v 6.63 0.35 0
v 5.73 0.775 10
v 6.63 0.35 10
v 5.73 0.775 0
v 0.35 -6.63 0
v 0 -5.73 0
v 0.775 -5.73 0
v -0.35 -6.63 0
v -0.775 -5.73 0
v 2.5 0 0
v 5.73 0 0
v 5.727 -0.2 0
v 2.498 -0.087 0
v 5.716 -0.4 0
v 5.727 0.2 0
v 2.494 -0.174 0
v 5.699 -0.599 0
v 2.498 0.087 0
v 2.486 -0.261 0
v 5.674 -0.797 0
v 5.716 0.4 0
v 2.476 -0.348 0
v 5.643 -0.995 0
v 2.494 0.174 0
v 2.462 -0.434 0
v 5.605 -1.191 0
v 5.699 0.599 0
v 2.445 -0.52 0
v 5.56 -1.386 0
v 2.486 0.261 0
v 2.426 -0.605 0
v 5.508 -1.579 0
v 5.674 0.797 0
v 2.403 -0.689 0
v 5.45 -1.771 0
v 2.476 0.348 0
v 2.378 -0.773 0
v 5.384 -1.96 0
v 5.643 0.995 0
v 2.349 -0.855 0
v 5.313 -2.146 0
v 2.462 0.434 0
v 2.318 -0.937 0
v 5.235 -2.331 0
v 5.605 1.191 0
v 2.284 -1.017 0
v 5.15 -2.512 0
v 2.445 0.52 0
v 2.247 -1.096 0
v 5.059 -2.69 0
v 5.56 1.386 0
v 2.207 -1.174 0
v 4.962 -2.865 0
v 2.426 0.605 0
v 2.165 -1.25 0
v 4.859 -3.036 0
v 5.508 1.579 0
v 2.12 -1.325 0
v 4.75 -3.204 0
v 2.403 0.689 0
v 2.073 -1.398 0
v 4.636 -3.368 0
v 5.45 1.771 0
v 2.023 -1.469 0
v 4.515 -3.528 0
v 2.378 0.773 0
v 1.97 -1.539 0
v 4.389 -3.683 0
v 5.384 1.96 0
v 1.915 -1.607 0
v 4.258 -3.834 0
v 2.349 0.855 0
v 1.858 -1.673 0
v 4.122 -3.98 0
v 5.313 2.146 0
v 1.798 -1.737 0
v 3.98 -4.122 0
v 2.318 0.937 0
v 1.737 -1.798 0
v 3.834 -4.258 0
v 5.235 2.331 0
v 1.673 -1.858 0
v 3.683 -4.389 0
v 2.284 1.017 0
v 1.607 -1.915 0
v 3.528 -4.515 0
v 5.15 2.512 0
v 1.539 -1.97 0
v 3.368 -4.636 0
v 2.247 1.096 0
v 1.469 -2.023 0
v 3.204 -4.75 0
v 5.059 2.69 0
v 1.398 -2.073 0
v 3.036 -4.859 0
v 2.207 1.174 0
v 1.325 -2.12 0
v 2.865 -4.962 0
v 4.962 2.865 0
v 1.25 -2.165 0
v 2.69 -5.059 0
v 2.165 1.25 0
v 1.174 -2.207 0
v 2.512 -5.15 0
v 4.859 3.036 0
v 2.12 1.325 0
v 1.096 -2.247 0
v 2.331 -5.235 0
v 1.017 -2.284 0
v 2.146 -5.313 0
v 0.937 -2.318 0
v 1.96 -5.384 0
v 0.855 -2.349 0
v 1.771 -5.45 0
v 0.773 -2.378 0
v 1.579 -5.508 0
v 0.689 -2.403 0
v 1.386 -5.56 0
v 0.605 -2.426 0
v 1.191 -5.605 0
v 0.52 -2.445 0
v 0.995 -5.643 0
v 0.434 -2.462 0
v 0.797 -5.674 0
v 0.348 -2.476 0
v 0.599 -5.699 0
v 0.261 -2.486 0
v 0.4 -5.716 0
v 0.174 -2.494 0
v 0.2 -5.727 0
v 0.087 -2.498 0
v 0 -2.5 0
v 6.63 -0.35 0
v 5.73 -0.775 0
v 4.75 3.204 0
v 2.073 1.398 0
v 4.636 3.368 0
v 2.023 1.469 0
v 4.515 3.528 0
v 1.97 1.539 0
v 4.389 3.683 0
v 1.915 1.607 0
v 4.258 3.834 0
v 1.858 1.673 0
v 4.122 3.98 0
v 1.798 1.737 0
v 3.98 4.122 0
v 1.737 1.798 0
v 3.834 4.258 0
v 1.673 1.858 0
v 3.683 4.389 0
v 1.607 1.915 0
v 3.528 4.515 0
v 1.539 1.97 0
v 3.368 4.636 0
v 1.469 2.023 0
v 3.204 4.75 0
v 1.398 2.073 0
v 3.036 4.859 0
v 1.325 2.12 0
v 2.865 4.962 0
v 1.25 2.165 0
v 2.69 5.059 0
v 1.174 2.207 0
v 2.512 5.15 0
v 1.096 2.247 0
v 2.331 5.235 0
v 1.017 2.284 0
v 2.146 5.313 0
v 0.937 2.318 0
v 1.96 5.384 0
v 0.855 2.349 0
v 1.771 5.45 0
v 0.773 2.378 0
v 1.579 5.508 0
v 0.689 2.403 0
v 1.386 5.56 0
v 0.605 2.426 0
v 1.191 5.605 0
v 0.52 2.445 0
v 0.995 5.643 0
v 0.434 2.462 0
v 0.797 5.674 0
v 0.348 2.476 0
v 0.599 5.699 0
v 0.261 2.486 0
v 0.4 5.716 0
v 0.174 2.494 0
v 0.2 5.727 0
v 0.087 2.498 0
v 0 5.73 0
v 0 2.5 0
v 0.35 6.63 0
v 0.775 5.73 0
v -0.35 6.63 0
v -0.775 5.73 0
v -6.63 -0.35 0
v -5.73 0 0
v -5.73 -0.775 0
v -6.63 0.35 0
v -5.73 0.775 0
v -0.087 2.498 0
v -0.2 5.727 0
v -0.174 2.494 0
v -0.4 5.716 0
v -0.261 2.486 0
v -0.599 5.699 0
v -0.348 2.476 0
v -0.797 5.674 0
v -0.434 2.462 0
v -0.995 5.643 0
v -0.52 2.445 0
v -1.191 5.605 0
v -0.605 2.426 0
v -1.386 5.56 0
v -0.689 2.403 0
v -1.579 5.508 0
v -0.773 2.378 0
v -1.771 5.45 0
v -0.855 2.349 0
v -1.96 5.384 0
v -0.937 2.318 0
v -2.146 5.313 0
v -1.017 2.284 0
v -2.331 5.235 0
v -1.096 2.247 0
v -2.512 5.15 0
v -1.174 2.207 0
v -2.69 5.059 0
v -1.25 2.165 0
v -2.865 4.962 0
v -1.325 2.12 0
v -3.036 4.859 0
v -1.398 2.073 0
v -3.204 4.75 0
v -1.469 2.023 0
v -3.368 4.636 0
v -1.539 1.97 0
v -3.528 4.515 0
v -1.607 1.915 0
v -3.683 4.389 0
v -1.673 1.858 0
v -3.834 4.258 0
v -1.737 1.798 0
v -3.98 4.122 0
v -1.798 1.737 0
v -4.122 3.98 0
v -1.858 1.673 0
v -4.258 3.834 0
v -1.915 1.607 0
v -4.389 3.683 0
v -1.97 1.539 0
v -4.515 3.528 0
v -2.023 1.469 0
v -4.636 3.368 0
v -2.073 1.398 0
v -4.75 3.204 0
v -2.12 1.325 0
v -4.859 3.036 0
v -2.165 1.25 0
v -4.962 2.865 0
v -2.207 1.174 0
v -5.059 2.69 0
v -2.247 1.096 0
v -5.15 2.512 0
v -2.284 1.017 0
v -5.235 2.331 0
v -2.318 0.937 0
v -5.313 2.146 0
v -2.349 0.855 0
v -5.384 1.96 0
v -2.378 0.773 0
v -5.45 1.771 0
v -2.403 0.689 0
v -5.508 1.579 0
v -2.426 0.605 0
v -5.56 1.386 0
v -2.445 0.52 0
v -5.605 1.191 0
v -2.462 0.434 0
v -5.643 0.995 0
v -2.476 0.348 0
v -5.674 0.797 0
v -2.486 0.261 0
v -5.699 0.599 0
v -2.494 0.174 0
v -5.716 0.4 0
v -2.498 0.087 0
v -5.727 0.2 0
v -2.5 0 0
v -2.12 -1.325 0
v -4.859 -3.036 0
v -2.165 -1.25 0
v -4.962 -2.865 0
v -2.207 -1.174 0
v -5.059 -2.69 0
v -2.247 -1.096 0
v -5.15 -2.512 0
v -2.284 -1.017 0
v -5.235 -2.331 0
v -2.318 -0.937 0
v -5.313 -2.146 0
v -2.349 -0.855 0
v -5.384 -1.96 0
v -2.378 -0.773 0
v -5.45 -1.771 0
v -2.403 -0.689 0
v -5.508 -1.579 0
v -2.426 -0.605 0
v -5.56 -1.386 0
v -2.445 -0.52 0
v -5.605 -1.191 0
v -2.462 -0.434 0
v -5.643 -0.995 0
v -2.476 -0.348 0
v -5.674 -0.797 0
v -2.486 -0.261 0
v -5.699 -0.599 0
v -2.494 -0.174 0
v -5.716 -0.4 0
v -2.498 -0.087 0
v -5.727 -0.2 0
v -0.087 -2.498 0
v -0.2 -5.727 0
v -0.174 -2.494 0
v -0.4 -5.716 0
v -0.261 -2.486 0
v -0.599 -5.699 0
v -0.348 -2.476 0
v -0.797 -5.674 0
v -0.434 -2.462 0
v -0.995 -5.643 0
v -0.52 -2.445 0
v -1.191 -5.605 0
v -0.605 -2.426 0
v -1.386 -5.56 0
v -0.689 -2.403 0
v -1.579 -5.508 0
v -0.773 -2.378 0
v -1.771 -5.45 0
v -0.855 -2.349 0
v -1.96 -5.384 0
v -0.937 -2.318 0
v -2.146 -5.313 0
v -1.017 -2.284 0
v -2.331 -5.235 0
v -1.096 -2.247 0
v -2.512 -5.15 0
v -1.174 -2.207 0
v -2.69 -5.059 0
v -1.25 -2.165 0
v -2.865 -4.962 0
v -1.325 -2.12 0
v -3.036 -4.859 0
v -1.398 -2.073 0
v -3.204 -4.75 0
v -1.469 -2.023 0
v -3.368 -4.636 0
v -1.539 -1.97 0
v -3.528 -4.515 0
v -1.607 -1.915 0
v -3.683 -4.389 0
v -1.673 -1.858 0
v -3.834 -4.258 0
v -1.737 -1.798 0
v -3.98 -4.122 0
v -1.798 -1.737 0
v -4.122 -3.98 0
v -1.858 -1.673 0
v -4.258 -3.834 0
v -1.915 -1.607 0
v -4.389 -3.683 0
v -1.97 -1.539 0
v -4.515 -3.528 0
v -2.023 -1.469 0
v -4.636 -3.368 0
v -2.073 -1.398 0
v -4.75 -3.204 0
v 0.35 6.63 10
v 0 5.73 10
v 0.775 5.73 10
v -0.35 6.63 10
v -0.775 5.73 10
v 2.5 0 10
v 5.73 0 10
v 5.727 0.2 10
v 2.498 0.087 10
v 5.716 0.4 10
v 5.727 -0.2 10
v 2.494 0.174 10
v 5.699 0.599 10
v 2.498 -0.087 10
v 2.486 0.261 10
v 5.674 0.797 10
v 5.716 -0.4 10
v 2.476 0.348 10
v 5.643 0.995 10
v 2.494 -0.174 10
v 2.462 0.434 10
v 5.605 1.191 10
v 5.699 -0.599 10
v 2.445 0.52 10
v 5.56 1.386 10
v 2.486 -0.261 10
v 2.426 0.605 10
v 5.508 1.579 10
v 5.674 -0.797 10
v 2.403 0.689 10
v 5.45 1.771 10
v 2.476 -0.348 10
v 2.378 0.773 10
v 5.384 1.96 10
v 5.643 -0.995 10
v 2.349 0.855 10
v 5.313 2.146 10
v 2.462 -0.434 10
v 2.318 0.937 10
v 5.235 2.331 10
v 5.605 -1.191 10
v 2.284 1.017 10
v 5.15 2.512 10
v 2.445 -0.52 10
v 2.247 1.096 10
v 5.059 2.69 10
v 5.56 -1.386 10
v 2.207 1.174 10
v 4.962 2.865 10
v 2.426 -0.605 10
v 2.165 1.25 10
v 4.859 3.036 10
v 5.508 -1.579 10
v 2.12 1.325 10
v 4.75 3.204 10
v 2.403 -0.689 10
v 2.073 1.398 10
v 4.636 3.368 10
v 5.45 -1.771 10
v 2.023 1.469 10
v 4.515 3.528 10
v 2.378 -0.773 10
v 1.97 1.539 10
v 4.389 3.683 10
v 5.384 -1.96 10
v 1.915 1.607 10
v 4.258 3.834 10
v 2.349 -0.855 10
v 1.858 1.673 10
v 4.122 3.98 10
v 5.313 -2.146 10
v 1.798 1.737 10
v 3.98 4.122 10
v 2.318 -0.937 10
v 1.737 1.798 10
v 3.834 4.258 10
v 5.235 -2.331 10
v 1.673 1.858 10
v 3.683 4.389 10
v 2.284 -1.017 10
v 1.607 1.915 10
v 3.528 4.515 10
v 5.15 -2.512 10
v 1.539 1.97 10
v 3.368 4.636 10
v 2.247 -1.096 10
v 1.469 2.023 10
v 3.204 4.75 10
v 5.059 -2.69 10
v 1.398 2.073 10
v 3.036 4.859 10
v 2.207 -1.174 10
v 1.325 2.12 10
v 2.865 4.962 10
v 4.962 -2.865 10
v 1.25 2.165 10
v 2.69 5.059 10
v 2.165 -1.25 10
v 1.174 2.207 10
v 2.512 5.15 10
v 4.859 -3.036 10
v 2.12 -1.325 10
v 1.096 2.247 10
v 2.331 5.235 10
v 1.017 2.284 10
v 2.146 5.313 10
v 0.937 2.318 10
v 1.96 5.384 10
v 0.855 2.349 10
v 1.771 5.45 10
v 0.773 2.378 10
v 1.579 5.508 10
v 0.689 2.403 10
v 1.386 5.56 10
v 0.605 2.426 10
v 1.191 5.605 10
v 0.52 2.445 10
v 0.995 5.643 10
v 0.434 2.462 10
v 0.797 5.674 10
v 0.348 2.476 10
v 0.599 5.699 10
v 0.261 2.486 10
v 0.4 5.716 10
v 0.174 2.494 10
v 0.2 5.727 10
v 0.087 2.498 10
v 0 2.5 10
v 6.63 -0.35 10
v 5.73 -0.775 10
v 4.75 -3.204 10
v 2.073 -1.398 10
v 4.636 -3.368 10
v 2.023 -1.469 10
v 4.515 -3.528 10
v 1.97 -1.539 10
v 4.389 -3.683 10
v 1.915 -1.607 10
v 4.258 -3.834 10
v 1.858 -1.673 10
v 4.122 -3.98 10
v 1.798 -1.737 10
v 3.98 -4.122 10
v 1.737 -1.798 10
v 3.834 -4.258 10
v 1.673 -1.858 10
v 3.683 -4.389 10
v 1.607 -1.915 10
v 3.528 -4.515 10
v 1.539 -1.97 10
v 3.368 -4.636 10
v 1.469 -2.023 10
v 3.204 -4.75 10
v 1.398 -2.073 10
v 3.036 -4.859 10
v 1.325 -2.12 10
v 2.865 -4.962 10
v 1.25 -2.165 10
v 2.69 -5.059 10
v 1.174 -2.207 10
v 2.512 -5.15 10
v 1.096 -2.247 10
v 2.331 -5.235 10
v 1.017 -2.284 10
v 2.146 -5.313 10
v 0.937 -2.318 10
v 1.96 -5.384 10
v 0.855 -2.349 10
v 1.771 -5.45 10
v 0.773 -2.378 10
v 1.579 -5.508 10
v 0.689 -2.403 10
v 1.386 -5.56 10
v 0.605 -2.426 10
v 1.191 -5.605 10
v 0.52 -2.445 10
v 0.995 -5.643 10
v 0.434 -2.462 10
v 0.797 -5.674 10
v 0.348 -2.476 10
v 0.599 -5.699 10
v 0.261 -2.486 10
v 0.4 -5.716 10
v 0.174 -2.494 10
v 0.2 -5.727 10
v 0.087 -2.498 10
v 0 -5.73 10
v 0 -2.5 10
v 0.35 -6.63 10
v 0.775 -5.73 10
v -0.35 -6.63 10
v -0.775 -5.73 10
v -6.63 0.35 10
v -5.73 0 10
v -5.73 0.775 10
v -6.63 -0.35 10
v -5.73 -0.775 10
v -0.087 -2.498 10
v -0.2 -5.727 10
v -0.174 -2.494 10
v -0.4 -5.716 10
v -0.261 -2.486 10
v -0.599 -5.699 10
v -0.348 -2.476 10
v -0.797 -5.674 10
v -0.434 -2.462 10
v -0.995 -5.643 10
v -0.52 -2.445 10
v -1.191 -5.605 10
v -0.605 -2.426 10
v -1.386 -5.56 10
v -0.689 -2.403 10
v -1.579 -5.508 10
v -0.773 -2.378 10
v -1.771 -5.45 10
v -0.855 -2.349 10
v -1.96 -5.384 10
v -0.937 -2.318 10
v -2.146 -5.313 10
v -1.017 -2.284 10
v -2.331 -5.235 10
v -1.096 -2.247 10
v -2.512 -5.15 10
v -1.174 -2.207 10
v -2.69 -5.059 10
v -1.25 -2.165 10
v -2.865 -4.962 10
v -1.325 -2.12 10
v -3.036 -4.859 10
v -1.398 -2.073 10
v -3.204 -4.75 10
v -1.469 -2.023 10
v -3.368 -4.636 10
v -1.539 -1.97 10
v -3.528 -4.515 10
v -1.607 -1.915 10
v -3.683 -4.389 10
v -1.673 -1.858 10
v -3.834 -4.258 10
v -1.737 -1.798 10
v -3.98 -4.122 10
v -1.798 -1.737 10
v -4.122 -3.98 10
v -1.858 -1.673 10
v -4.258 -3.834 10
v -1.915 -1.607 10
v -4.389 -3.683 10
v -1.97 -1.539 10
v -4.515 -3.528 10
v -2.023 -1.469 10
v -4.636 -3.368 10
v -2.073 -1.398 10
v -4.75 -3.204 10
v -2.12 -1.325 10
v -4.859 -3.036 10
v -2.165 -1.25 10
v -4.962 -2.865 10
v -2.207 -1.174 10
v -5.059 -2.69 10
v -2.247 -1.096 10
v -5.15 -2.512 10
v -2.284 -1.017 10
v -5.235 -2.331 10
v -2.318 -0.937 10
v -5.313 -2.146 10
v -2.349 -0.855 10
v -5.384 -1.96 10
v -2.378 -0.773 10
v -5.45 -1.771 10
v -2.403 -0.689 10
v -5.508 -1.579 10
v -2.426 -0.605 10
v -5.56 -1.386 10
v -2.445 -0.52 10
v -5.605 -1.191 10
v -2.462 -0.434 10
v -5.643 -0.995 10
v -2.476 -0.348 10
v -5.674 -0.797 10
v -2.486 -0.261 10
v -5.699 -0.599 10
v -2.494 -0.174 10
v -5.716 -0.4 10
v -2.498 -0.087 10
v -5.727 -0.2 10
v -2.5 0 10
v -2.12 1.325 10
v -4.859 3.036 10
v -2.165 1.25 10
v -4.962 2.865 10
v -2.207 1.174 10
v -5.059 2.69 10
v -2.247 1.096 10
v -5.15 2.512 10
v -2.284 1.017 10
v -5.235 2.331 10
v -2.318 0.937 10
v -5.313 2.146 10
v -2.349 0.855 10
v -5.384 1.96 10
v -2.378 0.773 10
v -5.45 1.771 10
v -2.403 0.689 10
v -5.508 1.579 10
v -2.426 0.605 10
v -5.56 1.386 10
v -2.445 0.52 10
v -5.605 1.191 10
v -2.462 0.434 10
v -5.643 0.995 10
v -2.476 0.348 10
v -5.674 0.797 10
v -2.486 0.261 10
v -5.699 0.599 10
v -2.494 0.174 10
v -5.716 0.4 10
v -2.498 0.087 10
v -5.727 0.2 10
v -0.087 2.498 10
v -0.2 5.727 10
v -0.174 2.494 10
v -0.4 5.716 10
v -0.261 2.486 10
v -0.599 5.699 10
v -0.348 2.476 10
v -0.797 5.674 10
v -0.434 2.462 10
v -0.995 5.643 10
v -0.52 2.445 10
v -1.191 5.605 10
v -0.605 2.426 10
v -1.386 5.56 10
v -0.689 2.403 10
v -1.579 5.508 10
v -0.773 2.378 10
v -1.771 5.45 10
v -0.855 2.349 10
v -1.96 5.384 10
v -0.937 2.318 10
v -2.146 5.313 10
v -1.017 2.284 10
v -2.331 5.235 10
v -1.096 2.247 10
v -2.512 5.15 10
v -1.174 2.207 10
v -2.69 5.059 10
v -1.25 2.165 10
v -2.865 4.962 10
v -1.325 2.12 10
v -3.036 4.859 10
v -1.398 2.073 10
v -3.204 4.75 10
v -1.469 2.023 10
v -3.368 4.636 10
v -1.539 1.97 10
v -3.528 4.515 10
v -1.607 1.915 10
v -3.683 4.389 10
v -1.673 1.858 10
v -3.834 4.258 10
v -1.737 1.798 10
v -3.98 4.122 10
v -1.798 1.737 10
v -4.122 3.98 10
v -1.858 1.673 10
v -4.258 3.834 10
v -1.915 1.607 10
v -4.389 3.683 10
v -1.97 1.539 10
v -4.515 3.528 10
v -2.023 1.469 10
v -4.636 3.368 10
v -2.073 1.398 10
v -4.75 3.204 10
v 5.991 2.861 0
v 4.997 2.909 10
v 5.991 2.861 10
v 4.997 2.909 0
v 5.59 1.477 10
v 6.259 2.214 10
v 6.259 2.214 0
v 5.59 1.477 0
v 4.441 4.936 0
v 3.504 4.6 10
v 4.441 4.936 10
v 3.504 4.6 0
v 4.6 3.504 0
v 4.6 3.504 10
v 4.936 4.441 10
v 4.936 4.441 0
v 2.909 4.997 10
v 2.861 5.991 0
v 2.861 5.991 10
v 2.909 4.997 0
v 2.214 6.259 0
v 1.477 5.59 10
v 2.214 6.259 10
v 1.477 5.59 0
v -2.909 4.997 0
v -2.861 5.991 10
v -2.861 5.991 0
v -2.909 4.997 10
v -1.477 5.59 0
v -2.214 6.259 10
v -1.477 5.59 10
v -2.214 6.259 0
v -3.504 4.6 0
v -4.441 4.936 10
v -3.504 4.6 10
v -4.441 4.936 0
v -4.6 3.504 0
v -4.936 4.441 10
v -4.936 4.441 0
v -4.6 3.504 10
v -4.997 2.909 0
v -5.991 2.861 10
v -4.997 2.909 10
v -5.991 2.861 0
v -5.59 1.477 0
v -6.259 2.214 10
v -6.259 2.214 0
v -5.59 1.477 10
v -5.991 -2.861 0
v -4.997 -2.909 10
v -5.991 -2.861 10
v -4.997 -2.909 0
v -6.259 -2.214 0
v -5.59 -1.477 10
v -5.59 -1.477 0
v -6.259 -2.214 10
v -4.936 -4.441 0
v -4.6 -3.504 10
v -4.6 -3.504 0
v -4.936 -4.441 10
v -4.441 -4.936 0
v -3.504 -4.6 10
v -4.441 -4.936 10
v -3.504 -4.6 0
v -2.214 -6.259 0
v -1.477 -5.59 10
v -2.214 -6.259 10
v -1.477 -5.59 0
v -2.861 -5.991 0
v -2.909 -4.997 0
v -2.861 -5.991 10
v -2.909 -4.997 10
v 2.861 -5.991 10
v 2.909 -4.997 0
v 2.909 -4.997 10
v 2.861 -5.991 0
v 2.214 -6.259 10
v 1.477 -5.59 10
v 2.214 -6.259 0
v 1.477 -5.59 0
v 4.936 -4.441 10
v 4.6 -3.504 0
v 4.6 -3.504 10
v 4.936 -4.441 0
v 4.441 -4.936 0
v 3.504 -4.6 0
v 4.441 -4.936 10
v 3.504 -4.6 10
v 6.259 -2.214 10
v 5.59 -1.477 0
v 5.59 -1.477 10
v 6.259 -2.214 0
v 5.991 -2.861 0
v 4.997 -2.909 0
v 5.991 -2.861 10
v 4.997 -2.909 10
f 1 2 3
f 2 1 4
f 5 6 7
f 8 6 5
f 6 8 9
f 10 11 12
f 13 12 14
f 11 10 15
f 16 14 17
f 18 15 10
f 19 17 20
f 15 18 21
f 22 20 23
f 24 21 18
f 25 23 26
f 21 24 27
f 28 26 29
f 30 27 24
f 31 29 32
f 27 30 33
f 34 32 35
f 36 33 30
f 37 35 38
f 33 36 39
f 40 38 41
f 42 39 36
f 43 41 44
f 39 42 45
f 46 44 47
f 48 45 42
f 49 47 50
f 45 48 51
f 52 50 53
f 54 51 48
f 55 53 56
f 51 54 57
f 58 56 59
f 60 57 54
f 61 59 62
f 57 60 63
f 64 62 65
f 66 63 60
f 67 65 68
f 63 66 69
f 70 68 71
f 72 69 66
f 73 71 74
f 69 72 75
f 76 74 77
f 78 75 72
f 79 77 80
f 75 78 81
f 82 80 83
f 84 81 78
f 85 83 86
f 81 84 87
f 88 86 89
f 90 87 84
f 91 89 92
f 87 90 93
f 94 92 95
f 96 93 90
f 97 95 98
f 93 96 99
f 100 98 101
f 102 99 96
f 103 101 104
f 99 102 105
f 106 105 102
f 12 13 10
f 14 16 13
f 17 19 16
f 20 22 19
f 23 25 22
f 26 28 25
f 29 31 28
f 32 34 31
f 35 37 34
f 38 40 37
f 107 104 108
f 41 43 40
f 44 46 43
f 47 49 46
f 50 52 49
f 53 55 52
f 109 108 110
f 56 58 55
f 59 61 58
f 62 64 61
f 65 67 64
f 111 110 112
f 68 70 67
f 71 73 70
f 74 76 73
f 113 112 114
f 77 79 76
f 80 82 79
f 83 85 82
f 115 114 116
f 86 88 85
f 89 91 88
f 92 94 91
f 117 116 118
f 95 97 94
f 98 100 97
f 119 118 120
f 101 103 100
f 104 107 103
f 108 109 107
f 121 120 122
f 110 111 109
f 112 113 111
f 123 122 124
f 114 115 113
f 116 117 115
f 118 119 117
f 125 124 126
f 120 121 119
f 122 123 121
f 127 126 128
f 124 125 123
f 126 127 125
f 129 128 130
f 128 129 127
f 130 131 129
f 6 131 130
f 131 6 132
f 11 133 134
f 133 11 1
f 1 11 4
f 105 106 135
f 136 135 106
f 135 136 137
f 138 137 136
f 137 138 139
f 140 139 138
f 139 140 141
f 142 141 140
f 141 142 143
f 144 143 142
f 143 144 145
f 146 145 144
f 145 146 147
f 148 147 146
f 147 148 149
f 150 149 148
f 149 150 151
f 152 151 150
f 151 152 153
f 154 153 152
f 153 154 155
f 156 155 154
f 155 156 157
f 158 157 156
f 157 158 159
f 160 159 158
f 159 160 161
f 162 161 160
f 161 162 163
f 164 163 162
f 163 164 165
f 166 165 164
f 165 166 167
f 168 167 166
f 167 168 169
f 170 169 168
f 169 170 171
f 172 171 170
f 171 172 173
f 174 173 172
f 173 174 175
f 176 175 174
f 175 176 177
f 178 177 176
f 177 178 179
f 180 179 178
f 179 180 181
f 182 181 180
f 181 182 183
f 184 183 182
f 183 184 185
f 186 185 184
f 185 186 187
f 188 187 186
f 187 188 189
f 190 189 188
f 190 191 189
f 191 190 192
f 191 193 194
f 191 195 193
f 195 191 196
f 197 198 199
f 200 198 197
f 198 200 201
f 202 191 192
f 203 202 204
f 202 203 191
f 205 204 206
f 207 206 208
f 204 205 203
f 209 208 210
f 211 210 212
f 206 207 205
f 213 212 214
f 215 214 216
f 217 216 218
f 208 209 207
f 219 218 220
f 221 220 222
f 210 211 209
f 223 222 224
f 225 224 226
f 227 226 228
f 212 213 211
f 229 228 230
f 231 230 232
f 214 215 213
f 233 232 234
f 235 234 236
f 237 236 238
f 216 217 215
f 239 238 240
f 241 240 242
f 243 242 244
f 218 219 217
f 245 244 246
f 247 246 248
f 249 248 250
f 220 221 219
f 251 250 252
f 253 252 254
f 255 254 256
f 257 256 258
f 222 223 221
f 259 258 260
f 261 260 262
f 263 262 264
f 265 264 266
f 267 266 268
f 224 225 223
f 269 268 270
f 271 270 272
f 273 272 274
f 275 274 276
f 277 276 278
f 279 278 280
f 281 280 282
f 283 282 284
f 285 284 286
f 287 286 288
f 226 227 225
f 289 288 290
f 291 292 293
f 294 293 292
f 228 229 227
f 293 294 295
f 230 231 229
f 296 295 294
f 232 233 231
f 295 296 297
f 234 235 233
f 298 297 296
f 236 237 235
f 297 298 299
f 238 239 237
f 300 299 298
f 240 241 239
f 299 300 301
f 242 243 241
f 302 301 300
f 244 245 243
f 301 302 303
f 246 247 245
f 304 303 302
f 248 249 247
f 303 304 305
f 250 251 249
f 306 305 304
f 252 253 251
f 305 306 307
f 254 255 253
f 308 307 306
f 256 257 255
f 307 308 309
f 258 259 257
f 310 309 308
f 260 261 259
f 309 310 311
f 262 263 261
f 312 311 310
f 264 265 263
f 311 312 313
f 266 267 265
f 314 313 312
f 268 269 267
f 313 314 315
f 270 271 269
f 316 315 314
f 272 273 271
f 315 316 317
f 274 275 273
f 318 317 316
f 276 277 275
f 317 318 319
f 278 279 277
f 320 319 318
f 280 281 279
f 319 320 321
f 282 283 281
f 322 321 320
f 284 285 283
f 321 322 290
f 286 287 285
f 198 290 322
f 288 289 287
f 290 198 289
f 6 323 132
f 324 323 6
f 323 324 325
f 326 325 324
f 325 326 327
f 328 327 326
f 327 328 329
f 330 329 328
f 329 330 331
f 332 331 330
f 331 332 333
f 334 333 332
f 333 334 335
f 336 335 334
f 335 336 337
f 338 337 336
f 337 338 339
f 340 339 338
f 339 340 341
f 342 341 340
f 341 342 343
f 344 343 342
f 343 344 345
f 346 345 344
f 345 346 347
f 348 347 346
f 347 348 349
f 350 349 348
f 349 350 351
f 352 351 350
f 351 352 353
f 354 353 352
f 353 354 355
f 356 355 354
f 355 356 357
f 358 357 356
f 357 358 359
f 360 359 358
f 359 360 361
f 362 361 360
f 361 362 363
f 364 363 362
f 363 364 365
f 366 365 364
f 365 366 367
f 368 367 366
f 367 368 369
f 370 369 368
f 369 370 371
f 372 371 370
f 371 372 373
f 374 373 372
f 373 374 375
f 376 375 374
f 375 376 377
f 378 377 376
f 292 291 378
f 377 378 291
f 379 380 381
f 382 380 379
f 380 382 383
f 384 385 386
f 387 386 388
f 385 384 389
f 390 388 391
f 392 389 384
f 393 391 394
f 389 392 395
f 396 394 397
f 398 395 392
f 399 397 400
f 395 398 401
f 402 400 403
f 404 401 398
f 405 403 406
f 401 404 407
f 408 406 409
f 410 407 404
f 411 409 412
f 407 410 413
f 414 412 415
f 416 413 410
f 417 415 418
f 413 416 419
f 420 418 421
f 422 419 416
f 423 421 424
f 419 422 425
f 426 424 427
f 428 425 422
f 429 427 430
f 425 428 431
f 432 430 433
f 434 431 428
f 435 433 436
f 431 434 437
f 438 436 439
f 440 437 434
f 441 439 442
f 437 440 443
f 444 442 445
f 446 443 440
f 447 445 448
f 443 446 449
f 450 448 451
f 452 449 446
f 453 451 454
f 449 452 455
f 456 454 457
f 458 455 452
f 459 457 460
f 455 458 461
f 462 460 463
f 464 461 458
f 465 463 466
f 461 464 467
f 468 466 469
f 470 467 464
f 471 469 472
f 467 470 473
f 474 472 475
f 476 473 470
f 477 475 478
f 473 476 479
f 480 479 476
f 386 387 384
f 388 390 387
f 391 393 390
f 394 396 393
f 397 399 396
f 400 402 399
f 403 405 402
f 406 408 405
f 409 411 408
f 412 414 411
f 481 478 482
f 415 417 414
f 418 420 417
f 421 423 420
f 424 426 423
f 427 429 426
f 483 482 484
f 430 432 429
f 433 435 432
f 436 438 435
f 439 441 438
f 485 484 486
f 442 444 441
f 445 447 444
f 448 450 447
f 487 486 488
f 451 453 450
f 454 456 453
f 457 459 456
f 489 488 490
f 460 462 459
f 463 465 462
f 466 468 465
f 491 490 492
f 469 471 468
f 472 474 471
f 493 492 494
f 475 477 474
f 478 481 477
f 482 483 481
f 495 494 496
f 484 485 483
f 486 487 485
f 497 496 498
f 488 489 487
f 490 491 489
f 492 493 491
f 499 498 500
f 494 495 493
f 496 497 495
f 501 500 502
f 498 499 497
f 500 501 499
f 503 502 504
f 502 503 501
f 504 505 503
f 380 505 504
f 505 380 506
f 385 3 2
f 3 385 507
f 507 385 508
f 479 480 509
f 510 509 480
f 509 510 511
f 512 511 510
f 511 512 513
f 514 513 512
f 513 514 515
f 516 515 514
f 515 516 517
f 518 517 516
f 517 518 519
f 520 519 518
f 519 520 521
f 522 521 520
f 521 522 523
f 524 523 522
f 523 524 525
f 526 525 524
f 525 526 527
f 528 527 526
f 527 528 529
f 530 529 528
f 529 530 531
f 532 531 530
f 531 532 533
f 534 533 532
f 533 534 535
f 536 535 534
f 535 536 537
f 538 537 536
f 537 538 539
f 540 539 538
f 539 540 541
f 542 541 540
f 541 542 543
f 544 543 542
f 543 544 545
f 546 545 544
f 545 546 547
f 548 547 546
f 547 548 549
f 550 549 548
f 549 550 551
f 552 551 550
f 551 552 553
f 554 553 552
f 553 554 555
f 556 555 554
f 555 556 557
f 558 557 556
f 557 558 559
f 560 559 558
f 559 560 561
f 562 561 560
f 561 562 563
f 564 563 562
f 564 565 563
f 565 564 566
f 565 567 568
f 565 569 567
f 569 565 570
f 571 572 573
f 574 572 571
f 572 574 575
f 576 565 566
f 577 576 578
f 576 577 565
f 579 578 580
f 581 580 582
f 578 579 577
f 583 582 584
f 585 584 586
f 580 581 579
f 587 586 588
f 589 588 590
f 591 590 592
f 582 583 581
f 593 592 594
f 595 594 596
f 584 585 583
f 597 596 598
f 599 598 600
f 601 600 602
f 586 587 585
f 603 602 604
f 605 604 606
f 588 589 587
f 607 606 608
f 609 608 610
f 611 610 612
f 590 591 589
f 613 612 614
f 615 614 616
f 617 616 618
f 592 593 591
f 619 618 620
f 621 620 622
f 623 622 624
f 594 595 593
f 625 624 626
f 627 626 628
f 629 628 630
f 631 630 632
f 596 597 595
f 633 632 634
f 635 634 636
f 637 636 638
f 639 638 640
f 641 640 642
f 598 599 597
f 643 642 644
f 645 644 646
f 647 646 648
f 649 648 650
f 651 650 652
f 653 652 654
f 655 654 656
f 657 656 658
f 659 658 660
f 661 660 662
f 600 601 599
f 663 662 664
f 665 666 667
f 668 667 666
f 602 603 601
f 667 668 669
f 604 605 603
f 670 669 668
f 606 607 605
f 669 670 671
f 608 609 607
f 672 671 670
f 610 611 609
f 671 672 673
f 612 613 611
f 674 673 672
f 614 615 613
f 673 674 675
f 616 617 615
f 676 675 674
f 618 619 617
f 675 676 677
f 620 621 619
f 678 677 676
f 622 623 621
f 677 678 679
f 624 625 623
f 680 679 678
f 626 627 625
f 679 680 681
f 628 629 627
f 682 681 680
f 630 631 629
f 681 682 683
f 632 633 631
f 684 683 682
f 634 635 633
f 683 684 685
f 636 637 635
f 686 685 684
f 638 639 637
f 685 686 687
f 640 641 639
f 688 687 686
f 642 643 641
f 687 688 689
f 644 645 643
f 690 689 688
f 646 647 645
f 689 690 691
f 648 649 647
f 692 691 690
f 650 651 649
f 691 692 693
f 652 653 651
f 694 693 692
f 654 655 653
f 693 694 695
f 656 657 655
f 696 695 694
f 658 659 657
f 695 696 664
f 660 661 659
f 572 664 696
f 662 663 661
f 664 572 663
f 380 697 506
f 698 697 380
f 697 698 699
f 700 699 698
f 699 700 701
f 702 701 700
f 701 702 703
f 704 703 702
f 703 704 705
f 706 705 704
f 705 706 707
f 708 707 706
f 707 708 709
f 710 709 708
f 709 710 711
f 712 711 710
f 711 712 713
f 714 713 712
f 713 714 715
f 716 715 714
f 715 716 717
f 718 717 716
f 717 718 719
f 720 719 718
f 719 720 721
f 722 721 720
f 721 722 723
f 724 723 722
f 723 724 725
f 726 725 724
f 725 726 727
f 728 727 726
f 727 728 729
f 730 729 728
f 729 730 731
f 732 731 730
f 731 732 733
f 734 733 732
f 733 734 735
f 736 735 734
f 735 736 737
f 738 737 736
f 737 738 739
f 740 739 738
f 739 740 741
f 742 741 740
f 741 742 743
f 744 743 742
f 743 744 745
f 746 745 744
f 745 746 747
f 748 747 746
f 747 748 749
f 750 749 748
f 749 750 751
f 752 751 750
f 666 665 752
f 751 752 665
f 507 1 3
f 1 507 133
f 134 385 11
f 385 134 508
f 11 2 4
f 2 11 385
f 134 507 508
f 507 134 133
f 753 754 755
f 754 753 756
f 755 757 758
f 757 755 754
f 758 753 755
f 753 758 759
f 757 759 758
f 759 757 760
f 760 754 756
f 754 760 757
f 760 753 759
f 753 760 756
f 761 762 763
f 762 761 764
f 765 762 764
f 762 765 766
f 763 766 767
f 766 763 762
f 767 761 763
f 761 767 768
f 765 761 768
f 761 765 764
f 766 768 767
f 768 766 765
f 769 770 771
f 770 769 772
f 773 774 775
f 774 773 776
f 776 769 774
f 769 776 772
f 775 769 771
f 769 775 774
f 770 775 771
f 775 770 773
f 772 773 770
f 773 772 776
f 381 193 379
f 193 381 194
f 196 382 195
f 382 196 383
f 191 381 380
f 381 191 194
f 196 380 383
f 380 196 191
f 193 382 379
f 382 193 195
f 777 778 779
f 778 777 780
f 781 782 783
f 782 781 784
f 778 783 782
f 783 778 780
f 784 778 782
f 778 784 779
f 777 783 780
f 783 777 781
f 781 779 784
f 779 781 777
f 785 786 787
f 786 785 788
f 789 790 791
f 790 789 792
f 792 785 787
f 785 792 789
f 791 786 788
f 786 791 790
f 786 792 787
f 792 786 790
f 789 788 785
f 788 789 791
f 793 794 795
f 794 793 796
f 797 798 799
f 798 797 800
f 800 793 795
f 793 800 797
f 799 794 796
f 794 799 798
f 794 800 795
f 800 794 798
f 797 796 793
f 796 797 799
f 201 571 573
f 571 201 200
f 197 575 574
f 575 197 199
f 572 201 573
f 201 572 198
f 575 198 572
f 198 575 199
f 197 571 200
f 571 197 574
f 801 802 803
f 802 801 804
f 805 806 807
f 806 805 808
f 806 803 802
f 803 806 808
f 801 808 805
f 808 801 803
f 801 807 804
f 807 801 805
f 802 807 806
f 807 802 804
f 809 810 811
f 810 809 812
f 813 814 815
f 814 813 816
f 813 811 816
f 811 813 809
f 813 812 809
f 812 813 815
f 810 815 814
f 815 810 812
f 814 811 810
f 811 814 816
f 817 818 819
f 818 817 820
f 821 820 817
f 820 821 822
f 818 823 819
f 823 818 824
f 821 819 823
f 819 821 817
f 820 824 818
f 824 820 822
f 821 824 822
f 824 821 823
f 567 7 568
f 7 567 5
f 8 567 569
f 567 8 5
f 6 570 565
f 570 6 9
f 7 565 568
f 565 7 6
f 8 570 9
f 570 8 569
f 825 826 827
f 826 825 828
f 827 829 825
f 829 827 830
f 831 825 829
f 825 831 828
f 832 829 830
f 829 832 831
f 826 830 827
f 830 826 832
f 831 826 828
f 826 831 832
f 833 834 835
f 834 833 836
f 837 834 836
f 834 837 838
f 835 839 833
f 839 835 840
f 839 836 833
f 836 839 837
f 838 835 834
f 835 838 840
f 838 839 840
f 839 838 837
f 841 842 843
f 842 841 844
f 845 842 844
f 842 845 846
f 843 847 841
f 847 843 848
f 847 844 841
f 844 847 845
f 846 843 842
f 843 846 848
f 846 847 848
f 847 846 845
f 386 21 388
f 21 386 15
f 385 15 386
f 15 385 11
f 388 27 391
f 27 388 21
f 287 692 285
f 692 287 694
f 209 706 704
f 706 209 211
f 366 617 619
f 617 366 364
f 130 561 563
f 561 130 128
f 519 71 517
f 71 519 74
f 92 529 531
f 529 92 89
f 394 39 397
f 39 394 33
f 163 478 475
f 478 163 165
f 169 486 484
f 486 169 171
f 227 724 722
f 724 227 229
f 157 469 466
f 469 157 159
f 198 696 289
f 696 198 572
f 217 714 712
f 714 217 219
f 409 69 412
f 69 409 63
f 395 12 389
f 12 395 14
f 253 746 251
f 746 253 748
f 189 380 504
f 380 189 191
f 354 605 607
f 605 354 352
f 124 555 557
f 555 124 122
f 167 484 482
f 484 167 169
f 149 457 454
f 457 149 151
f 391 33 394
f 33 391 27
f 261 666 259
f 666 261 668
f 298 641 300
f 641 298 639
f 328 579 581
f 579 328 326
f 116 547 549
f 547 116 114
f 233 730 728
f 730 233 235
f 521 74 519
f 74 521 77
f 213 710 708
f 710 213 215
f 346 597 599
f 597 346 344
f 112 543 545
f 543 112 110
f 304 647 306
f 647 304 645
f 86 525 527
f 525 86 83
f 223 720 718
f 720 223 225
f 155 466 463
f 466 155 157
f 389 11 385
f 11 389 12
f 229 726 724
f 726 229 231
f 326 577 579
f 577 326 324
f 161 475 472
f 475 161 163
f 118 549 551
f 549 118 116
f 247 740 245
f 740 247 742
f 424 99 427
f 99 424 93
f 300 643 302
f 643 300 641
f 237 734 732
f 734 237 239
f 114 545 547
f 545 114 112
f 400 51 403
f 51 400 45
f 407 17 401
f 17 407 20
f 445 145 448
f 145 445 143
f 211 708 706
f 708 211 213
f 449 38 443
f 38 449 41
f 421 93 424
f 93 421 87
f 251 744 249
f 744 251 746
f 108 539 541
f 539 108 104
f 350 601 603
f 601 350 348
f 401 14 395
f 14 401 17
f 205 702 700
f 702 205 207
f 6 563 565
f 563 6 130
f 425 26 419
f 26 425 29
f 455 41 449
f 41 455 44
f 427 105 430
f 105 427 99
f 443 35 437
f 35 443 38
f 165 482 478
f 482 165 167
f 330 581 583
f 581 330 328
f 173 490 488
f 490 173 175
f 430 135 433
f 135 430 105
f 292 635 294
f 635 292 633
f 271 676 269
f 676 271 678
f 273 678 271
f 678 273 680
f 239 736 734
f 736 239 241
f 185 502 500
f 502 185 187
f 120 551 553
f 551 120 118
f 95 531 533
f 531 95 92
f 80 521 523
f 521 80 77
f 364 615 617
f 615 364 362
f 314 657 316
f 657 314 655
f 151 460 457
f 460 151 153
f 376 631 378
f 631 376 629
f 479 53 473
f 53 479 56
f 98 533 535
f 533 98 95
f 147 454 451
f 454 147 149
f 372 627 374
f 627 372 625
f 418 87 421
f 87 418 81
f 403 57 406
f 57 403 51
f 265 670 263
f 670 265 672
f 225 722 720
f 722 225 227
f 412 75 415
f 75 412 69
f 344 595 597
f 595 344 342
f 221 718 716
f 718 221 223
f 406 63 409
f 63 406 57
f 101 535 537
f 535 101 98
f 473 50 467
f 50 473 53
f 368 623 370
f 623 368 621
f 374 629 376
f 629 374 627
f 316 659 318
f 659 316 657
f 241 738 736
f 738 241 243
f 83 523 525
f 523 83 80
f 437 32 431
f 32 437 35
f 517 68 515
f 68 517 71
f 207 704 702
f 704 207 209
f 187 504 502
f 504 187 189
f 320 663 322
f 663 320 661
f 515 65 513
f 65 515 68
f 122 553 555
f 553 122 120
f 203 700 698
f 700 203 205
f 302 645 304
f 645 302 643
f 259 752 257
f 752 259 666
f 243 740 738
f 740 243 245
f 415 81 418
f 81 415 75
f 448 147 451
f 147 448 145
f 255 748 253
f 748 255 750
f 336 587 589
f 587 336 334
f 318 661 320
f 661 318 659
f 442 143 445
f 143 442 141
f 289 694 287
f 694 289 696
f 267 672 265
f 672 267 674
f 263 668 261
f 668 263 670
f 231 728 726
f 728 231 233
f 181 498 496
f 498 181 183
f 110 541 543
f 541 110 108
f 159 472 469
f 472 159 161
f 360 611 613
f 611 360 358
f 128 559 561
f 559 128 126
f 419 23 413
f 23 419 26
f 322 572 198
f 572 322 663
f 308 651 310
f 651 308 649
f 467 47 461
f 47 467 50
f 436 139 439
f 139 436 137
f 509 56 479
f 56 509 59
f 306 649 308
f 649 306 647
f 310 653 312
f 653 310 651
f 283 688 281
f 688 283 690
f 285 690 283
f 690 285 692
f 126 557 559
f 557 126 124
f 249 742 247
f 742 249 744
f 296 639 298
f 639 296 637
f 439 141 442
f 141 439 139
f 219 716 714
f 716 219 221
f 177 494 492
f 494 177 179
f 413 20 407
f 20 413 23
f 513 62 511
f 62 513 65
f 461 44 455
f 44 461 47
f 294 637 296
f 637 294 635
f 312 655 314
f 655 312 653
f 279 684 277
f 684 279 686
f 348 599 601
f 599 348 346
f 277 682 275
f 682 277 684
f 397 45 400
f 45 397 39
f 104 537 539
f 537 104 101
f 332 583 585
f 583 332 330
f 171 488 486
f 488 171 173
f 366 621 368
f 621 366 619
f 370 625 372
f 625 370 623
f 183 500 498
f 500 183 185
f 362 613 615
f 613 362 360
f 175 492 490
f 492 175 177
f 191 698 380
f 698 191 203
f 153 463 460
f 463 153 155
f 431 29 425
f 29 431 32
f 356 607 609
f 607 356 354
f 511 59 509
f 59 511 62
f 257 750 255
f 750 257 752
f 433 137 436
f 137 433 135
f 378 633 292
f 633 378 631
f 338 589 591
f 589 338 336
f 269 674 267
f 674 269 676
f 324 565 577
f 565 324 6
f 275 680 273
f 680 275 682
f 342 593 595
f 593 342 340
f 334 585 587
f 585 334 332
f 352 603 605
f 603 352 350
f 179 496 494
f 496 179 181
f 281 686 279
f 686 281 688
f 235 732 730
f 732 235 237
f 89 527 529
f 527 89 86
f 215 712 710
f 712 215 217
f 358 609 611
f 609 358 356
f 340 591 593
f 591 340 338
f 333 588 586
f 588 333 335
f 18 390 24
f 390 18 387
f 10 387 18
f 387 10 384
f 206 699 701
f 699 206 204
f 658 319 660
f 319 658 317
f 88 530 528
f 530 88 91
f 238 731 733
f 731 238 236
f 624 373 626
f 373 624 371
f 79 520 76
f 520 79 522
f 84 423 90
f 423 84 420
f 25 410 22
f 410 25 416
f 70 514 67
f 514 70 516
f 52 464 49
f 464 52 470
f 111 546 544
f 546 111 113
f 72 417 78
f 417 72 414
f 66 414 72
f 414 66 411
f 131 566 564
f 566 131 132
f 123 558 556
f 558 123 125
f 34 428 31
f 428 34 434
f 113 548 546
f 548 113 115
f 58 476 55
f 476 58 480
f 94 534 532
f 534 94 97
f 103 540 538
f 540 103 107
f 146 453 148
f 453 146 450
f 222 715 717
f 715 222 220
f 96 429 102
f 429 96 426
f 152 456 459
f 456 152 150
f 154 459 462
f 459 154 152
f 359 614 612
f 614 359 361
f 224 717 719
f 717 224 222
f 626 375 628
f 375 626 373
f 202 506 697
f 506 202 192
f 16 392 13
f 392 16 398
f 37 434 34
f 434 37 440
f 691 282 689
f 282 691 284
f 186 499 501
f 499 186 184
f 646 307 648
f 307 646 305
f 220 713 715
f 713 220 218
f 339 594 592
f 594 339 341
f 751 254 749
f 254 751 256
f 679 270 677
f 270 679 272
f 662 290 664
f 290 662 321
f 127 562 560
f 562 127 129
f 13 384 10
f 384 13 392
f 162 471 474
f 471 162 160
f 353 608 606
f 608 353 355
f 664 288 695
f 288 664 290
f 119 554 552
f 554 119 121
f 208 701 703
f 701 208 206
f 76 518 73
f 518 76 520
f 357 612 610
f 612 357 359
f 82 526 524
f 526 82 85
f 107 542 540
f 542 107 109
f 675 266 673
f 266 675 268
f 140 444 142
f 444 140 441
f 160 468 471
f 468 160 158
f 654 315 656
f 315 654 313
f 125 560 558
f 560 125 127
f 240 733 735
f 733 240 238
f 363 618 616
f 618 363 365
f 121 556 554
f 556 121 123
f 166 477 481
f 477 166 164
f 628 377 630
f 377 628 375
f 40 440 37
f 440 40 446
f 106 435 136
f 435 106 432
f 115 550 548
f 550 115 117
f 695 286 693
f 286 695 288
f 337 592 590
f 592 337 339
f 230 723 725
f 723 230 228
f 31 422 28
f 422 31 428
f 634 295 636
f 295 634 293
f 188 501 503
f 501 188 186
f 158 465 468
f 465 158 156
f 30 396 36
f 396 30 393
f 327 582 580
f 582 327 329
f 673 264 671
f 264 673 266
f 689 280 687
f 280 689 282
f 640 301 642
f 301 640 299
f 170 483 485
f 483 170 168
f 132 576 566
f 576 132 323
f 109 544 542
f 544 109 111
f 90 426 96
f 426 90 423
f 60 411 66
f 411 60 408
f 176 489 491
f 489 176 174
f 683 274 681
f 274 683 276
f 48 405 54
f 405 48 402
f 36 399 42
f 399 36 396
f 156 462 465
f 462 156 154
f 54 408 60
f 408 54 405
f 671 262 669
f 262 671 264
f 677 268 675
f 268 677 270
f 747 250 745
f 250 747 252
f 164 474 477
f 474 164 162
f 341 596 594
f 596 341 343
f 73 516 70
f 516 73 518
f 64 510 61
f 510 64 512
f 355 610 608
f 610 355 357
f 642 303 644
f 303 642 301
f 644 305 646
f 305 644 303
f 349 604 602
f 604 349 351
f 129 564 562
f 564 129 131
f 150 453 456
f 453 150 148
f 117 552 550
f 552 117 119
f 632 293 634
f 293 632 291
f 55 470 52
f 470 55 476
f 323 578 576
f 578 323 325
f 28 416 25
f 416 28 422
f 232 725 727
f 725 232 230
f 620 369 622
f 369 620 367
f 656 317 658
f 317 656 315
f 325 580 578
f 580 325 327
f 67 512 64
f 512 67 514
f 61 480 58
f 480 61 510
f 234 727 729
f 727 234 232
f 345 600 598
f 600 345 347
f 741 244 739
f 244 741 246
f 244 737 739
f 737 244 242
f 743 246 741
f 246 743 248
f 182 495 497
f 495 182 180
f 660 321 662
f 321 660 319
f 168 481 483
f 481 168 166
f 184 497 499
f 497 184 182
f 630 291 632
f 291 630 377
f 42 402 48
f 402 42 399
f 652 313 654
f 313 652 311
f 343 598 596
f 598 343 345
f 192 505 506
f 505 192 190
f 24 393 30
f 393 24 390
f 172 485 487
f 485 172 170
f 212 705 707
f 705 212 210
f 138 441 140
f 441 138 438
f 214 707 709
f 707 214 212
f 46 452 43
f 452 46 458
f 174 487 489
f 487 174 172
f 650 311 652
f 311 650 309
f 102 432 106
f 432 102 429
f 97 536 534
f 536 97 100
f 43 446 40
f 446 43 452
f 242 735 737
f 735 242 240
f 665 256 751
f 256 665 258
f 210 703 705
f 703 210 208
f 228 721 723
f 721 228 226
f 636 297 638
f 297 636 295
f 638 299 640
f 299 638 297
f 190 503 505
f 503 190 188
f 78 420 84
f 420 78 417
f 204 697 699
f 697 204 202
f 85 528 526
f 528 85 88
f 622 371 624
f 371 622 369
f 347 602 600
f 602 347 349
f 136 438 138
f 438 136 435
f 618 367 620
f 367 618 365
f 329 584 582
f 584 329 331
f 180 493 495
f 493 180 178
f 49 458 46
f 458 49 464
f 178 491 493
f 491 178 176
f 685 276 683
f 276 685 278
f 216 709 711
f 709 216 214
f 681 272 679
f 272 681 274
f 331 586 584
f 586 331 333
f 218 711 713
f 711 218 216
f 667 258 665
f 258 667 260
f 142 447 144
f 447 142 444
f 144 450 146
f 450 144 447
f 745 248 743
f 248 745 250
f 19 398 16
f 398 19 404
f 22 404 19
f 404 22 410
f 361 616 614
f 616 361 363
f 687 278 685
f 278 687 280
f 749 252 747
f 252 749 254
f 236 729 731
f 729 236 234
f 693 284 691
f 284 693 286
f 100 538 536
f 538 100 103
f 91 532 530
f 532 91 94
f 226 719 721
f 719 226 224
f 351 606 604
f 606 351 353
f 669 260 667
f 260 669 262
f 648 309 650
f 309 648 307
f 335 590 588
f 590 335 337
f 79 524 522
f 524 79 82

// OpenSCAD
$fn = 180;

// Timing pulley with visible teeth
// Requirements: 16 teeth, 12.16mm pitch diameter
teeth   = 16;
pitch_d = 12.16;
pitch_r = pitch_d/2;

pulley_h = 10;      // overall height
bore_d   = 5;       // center bore

// Tooth geometry (simple GT2-like approximation)
tooth_depth  = 0.90;   // radial height above root
root_clear   = 0.35;   // pitch circle to root
tooth_tip_w  = 0.70;   // tangential width at tip
tooth_root_w = 1.55;   // tangential width at root

// Derived radii
root_r = pitch_r - root_clear;
tip_r  = root_r + tooth_depth;

// Ensure teeth are not hidden by an oversized hub.
// Hub is kept slightly inside the root diameter so teeth remain visible.
hub_d = min(2*(root_r - 0.20), 2*root_r);
hub_h = pulley_h;

module tooth2d() {
    // Trapezoid centered on +X axis (radial direction), Y is tangential
    polygon(points=[
        [root_r, -tooth_root_w/2],
        [root_r,  tooth_root_w/2],
        [tip_r,   tooth_tip_w/2],
        [tip_r,  -tooth_tip_w/2]
    ]);
}

module pulley() {
    difference() {
        union() {
            // Root cylinder (tooth base)
            cylinder(h=pulley_h, r=root_r, center=false);

            // Teeth (radial array)
            for (i = [0:teeth-1]) {
                rotate([0,0, i*360/teeth])
                    linear_extrude(height=pulley_h)
                        tooth2d();
            }

            // Hub (kept inside root so it doesn't cover teeth)
            cylinder(h=hub_h, d=hub_d, center=false);
        }

        // Bore (slightly extended to guarantee through-cut)
        translate([0,0,-0.5])
            cylinder(h=pulley_h+1, d=bore_d, center=false);
    }
}

pulley();
